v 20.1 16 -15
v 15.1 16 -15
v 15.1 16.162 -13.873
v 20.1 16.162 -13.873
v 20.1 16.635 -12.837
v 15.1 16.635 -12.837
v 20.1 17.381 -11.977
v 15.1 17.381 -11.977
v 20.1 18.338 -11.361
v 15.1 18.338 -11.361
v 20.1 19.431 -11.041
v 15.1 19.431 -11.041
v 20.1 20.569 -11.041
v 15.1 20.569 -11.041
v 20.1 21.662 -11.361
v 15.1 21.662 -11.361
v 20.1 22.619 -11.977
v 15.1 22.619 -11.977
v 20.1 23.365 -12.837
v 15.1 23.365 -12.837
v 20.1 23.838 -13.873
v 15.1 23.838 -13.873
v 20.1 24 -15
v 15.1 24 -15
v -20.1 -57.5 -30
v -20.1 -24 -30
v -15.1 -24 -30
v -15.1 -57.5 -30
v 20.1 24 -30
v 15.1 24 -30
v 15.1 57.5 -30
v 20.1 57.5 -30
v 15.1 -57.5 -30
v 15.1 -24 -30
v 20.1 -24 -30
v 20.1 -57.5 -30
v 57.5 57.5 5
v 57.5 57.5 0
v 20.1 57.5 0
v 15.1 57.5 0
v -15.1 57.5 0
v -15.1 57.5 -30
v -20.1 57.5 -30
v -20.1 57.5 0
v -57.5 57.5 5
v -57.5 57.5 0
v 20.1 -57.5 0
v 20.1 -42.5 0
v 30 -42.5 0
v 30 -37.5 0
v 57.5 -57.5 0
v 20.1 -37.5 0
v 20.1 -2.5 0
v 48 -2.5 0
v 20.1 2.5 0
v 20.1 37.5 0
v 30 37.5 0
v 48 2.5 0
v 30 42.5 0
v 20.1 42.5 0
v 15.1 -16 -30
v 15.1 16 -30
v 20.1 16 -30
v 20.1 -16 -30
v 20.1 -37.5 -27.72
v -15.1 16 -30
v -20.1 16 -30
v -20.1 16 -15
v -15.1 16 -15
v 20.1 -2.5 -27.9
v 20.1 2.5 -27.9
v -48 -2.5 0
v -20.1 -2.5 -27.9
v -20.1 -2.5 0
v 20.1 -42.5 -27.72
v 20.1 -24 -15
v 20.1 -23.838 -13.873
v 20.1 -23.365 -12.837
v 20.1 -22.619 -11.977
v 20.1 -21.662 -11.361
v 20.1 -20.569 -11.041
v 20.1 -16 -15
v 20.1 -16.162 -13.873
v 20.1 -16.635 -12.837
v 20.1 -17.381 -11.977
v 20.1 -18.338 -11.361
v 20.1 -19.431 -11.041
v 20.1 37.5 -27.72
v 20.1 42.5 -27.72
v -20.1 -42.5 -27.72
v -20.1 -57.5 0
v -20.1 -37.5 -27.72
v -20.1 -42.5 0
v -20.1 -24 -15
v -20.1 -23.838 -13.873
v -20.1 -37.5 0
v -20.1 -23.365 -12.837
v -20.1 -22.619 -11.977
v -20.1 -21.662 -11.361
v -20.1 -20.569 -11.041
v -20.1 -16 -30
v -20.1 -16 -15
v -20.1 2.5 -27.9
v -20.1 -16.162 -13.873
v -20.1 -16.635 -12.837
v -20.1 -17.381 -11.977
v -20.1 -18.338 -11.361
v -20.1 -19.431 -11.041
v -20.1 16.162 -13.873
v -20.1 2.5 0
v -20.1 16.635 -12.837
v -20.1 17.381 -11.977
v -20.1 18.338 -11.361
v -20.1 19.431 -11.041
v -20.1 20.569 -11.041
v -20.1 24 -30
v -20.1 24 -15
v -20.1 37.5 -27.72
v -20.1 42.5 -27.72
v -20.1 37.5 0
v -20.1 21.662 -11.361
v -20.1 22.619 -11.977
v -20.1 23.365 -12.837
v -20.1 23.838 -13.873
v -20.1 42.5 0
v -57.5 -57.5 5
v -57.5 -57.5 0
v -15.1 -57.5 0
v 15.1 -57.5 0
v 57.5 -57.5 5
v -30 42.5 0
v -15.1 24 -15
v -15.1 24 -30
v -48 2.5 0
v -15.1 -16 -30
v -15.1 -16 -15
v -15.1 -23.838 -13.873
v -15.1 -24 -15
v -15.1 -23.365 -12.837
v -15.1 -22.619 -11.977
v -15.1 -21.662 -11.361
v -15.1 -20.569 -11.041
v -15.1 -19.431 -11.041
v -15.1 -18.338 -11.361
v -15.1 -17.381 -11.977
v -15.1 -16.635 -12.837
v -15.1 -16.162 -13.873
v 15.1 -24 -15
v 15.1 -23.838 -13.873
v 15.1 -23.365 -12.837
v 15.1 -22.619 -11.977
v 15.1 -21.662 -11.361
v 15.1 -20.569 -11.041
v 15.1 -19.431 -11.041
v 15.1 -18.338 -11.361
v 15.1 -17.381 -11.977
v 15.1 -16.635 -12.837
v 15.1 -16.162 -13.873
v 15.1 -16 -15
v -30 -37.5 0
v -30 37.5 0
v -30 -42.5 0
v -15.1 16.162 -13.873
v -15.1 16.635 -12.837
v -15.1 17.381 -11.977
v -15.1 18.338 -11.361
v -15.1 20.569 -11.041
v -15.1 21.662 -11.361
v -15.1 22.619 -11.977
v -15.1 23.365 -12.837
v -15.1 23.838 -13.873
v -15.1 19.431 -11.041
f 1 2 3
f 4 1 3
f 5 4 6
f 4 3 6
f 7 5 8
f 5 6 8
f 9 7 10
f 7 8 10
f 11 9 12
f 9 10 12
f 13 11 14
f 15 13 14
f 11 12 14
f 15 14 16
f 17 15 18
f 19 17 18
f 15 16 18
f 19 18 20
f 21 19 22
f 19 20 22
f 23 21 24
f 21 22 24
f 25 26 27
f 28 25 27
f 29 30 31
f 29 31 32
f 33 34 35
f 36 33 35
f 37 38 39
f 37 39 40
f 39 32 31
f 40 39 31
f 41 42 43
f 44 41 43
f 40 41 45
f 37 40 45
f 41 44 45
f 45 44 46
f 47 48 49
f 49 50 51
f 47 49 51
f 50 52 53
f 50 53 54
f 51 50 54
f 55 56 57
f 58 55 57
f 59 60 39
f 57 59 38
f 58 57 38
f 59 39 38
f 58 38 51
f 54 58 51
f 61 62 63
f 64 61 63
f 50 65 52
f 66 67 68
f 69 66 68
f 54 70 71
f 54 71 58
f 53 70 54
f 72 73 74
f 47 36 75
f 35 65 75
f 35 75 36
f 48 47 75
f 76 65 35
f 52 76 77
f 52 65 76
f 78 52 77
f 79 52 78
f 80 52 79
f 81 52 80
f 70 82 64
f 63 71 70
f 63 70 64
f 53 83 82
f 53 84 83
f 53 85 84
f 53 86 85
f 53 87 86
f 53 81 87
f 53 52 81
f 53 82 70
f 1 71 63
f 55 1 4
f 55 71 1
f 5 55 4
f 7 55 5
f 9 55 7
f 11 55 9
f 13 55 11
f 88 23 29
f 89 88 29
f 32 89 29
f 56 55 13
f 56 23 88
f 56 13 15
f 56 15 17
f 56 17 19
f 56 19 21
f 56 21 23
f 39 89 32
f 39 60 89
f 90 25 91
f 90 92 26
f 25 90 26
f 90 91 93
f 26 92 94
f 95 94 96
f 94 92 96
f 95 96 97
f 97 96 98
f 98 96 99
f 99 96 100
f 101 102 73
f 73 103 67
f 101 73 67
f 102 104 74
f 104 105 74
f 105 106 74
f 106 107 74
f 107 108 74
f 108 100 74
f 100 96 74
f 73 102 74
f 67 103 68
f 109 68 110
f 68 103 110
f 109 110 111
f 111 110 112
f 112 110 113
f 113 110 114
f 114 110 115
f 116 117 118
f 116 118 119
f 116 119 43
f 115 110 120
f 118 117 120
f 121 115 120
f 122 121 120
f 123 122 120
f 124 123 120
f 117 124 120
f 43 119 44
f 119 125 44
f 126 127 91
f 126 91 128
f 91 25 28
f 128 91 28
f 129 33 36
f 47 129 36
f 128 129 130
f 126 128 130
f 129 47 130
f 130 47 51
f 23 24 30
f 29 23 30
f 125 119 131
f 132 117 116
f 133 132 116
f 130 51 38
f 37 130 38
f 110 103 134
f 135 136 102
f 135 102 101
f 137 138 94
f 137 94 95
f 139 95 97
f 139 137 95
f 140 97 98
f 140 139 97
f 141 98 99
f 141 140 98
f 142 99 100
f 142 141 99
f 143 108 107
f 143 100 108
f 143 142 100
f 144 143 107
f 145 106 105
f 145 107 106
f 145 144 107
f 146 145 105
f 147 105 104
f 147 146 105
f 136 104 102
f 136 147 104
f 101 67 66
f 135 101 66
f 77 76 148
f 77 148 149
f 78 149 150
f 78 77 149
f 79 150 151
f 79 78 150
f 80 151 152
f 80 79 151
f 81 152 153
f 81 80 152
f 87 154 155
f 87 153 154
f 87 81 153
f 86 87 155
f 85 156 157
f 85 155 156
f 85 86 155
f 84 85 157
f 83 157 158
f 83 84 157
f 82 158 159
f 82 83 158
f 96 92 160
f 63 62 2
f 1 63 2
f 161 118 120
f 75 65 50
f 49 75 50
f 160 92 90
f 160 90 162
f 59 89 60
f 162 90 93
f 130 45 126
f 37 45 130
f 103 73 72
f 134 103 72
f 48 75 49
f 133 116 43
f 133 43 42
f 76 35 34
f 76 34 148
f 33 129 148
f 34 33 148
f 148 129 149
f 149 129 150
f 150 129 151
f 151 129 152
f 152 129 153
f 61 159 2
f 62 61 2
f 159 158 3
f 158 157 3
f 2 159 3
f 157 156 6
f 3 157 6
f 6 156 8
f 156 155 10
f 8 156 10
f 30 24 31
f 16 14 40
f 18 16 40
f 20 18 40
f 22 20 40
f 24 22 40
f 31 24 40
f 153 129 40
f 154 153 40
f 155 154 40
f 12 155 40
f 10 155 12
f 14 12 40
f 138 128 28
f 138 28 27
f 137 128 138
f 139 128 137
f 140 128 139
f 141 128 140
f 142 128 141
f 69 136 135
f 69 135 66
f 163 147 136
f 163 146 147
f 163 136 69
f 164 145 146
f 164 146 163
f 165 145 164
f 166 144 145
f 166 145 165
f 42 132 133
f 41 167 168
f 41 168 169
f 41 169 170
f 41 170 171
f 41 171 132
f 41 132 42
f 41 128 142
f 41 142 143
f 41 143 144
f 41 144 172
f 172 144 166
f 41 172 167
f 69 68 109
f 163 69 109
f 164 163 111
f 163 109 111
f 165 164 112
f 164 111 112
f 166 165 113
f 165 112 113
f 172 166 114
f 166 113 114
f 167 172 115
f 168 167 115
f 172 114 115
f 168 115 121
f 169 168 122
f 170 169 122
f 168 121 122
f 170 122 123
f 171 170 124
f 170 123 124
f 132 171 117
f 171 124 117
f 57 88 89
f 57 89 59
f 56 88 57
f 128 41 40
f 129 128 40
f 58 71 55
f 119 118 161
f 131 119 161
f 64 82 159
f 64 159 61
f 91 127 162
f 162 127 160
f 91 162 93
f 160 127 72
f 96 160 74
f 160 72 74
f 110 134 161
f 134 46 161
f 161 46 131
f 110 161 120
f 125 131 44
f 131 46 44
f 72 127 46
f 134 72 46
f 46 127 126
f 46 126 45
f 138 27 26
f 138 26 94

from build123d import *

# Parameters (mm, degrees)
SKETCH_1_W               = 5
SKETCH_1_H               = 115
EXTRUDE_1_DEPTH          = 30
EXTRUDE_1_2_DEPTH        = 30
SKETCH_1_3_W             = 115
SKETCH_1_3_H             = 115
EXTRUDE_2_DEPTH          = 5
CUT_EXTRUDE_1_DEPTH      = 22.5
RIB_1_REACH              = 88.675
SKETCH_4_WALL_W          = 214.94733798
SKETCH_4_WALL_H          = 5
RIB_2_REACH              = 119.1
SKETCH_7_WALL_W          = 265.932906068
SKETCH_7_WALL_H          = 5
MIRROR_3_COPY_1_REACH    = 119.1
MIRROR_3_COPY_1_SKETCH_W = 265.932906068
MIRROR_3_COPY_1_SKETCH_H = 5
MIRROR_3_COPY_2_REACH    = 119.1
MIRROR_3_COPY_2_SKETCH_W = 265.932906068
MIRROR_3_COPY_2_SKETCH_H = 5


with BuildPart() as part:
    # 스케치1 → 보스-돌출1 (new body)
    with BuildSketch(Plane.XY):
        with Locations((-17.6, 0)):
            Rectangle(SKETCH_1_W, SKETCH_1_H)
    extrude(amount=-EXTRUDE_1_DEPTH)



with BuildPart() as body_2:
    # 스케치1 → Extrude 1 2 (new body)
    with BuildSketch(Plane.XY):
        with Locations((17.6, 0)):
            Rectangle(SKETCH_1_W, SKETCH_1_H)
    extrude(amount=-EXTRUDE_1_2_DEPTH)


with BuildPart() as part_1:
    add(part.part)

    add(body_2.part)  # 보스-돌출2 merges body 2
    # 스케치1<3> → 보스-돌출2 (add)
    with BuildSketch(Plane.XY):
        Rectangle(SKETCH_1_3_W, SKETCH_1_3_H)
    extrude(amount=EXTRUDE_2_DEPTH)

    # 스케치3 → 컷-돌출1 (cut, symmetric)
    with BuildSketch(Plane(origin=(0, 0, 0), x_dir=(0, 0, -1), z_dir=(1, 0, 0))):
        with BuildLine():
            Line((15, 24), (30, 24))
            Line((30, 24), (30, 16))
            Line((30, 16), (15, 16))
            ThreePointArc((15, 16), (11, 20), (15, 24))
        make_face()
        with BuildLine():
            Line((30, -16), (30, -24))
            Line((30, -24), (15, -24))
            ThreePointArc((15, -24), (11, -20), (15, -16))
            Line((15, -16), (30, -16))
        make_face()
    extrude(amount=CUT_EXTRUDE_1_DEPTH, both=True, mode=Mode.SUBTRACT)

    # 스케치4 wall → 보강대1 (add, up to next)
    with BuildSketch(Plane(origin=(34, 0, -14), x_dir=(0.707106781187, 0, 0.707106781187), z_dir=(0.707106781187, 0, -0.707106781187)), mode=Mode.PRIVATE) as rib_1_sk1:
        Rectangle(SKETCH_4_WALL_W, SKETCH_4_WALL_H)
    rib_1_tool1 = extrude(rib_1_sk1.sketch, amount=-RIB_1_REACH, mode=Mode.PRIVATE) - part_1.part
    rib_1 = rib_1_tool1.solids().sort_by_distance((34, 0, -14))[0]
    add(rib_1)

    # 스케치7 wall → 보강대2 (add, up to next)
    with BuildSketch(Plane(origin=(25, 40, -14), x_dir=(0.336336396998, 0, 0.941741911595), z_dir=(0.941741911595, 0, -0.336336396998)), mode=Mode.PRIVATE) as rib_2_sk1:
        Rectangle(SKETCH_7_WALL_W, SKETCH_7_WALL_H)
    rib_2_tool1 = extrude(rib_2_sk1.sketch, amount=-RIB_2_REACH, mode=Mode.PRIVATE) - part_1.part
    rib_2 = rib_2_tool1.solids().sort_by_distance((25, 40, -14))[0]
    add(rib_2)

    # 대칭 복사1: 보강대1 across plane
    add(rib_1.mirror(Plane.ZY))

    # 대칭 복사2: 보강대2 across plane
    add(rib_2.mirror(Plane.ZY))

    # 대칭 복사3 copy 1 sketch → 대칭 복사3 copy 1 (add, up to next)
    with BuildSketch(Plane(origin=(-25, -40, -14), x_dir=(-0.336336396998, 0, 0.941741911595), z_dir=(-0.941741911595, 0, -0.336336396998)), mode=Mode.PRIVATE) as mirror_3_copy_1_sk1:
        Rectangle(MIRROR_3_COPY_1_SKETCH_W, MIRROR_3_COPY_1_SKETCH_H)
    mirror_3_copy_1_tool1 = extrude(mirror_3_copy_1_sk1.sketch, amount=-MIRROR_3_COPY_1_REACH, mode=Mode.PRIVATE) - part_1.part
    add(mirror_3_copy_1_tool1.solids().sort_by_distance((-25, -40, -14))[0])

    # 대칭 복사3 copy 2 sketch → 대칭 복사3 copy 2 (add, up to next)
    with BuildSketch(Plane(origin=(25, -40, -14), x_dir=(0.336336396998, 0, 0.941741911595), z_dir=(0.941741911595, 0, -0.336336396998)), mode=Mode.PRIVATE) as mirror_3_copy_2_sk1:
        Rectangle(MIRROR_3_COPY_2_SKETCH_W, MIRROR_3_COPY_2_SKETCH_H)
    mirror_3_copy_2_tool1 = extrude(mirror_3_copy_2_sk1.sketch, amount=-MIRROR_3_COPY_2_REACH, mode=Mode.PRIVATE) - part_1.part
    add(mirror_3_copy_2_tool1.solids().sort_by_distance((25, -40, -14))[0])


solid = part_1.part
